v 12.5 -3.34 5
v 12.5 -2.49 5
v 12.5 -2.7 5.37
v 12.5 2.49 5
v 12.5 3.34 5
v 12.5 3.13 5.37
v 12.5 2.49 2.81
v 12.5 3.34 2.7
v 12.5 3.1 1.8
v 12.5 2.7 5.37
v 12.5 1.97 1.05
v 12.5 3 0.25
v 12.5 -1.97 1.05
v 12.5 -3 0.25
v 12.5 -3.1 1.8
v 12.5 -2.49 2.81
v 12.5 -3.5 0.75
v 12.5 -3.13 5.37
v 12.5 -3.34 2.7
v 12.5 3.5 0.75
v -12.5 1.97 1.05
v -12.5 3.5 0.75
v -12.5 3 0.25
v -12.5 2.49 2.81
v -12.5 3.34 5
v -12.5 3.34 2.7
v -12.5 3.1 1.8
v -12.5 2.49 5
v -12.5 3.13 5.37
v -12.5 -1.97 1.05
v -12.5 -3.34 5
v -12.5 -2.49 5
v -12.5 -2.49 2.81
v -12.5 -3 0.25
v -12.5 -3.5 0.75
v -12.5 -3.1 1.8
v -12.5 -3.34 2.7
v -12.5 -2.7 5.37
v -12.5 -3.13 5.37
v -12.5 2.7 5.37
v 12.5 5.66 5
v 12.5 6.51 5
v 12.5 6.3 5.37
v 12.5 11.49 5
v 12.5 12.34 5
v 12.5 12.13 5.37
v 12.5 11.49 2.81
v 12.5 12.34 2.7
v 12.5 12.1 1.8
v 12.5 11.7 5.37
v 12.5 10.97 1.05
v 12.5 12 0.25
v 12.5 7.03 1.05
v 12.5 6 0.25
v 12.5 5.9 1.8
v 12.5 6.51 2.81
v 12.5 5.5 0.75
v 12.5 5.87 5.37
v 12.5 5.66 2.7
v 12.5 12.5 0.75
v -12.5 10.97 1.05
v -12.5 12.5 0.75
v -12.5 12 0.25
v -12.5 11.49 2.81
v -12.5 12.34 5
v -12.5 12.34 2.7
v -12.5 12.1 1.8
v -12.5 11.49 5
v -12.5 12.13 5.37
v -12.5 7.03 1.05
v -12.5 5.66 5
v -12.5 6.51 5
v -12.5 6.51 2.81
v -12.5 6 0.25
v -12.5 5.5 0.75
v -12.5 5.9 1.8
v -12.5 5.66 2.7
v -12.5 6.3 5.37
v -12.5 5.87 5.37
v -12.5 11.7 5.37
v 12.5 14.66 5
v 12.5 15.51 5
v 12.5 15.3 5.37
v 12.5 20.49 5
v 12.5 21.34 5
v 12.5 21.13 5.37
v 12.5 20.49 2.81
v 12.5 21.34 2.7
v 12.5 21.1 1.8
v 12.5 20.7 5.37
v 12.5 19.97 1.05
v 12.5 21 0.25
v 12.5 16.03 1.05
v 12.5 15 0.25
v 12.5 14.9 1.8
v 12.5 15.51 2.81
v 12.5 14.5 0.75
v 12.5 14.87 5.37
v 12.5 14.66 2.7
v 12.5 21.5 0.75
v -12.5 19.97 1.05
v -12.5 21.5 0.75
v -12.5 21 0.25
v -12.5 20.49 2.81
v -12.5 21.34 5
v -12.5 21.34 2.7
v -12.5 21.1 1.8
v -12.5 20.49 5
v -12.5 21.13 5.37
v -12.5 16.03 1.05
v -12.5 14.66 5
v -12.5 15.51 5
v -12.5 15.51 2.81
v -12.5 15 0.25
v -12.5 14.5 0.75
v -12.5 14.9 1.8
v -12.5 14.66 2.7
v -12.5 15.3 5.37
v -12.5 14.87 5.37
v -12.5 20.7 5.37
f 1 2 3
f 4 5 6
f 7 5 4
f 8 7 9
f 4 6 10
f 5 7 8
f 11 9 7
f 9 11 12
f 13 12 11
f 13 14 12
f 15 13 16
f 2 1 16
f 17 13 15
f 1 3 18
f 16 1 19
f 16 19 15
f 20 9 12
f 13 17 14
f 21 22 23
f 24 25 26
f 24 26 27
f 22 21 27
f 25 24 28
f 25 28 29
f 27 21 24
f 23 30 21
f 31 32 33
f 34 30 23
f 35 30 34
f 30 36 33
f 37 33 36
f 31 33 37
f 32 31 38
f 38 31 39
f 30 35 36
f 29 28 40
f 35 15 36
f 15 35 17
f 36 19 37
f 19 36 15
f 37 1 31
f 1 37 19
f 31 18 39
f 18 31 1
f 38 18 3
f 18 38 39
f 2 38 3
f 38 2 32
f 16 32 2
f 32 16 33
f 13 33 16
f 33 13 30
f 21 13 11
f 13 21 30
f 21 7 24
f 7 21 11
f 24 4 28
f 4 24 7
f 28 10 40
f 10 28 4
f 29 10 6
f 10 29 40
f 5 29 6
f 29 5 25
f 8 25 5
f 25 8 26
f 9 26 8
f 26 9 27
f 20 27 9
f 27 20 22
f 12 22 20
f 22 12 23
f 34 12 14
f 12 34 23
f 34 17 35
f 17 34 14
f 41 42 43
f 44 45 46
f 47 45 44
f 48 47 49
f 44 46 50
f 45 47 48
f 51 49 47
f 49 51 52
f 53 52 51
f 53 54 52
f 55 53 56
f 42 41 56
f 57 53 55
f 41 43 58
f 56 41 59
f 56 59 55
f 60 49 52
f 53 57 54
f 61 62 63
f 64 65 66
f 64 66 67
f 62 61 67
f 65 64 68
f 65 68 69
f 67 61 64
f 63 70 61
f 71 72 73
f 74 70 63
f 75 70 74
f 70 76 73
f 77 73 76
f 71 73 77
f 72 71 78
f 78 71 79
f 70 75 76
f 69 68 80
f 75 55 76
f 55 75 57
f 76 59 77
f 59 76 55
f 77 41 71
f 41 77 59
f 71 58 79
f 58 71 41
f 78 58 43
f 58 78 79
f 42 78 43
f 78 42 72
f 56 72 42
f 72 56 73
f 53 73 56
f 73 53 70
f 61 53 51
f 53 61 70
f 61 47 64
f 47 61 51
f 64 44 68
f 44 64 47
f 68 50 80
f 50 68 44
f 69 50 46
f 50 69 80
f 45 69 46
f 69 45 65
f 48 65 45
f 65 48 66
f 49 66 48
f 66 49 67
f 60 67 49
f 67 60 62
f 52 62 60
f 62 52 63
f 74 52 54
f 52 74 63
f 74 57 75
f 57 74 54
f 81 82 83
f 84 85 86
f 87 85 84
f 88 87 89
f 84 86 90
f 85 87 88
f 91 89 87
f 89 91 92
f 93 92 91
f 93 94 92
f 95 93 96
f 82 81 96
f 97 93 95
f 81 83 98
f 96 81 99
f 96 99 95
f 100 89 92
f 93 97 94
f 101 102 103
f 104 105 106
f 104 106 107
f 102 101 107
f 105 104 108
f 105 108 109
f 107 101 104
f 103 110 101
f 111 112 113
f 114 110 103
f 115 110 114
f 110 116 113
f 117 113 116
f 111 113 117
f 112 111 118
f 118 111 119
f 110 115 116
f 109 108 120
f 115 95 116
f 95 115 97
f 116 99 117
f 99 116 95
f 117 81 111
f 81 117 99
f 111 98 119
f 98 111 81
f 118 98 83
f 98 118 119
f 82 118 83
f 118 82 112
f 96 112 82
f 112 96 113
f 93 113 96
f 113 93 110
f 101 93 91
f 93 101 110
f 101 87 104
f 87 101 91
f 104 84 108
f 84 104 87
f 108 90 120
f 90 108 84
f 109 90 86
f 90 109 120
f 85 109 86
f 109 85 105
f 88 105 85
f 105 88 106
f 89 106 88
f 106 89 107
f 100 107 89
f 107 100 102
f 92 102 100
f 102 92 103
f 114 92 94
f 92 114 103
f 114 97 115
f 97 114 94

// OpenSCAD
//Remix of V-Slot cover for adjustable fit
//2/16/2019 By David Bunch
//Remixed from: https://www.thingiverse.com/thing:832077
//
Test = 0;           //0 = Final Print,  1 = Test Print
Len = 25;          //165 * 3 = 495mm
Qty = 3;
Gap = 3.1;          //3.1 = 1/2 Dimensioned Gap distance where channel connects to V-Slot

V1 = 0.0;           //Thickness at V connection
                    //0.1 would be tighter fit, -0.1 would be looser fit
                    //-.1 works best for me
Z1 =  .25;

A_T1 = [.05, .025, 0, -.025 -.05, -.075];      //Used for Test print
Test_Qty = len(A_T1);
echo(Test_Qty = Test_Qty);

// StampN = 1; // Number of stamps: 0 - no stamps, 1 - one centered, ...
StampText = ""; // Set to empty string to use image
StampImport2D = "bear2.dxf"; // Used only inf StampText is empty
StampImage = "bear1.png"; // Used only if StampText and StampImport2D is empty
StampColor = "Red";
StampDepth = 0.3; // 0.8 - Maximum 
StampHeight = 4.2; // Define size of text or image height

// Setting number of stamps automatic by slot length and text lenght

ll = len(StampText)>0 ? len(StampText) : 1;

StampN = (Test==1) ? 1 : Len/(5*ll);


		
module V2020(V_Ht = Len)
{
    rotate([0,-90,0])
    rotate([0,0,-90])
    translate([0,10,0])
    difference()
    {
        linear_extrude(height = V_Ht, center = false, convexity = 10)polygon(points = 
        [[10,10],[10,4.9],[8.2,3.1],[8.2,5.5],[6.56,5.5],
        [3.9,2.84],[3.9,-2.84],[6.56,-5.5],[8.2,-5.5],[8.2,-3.1],
        [10,-4.9],[10,-10],[4.9,-10],[3.1,-8.2],[5.5,-8.2],
        [5.5,-6.56],[2.84,-3.9],[-2.84,-3.9],[-5.5,-6.56],[-5.5,-8.2],
        [-3.1,-8.2],[-4.9,-10],[-10,-10],[-10,-4.9],[-8.2,-3.1],
        [-8.2,-5.5],[-6.56,-5.5],[-3.9,-2.84],[-3.9,2.84],[-6.56,5.5],
        [-8.2,5.5],[-8.2,3.1],[-10,4.9],[-10,10],[-4.9,10],
        [-3.1,8.2],[-5.5,8.2],[-5.5,6.56],[-2.84,3.9],[2.84,3.9],
        [5.5,6.56],[5.5,8.2],[3.1,8.2],[4.9,10]]);
        translate([0,0,-1])
        cylinder(d=4.2,h=V_Ht+2,center=false,$fn=16);
    }
}
module Channel(T1 = -.1, Y1 = Z1)
{
    X1 = Gap + T1;
    echo(X1 = X1);
    echo(X1 * 2);
    rotate([0,-90,0])
    rotate([0,0,-90])
    linear_extrude(height = Len, center = false, convexity = 10)
	polygon(points = 
    [[3.13+T1,5.37],[3.34+T1,5],[3.34+T1,2.7],[3.1+T1,1.8],[3.5+T1,0.5+Y1],
    [3+T1,Y1],[-3-T1,Y1],[-3.5-T1,0.5+Y1],[-3.1-T1,1.8],[-3.34-T1,2.7],
    [-3.34-T1,5],[-3.13-T1,5.37],[-2.7-T1,5.37],[-2.49-T1,5],[-2.49-T1,2.81],
    [-1.97-T1,.8+Y1],[1.97+T1,.8+Y1],[2.49+T1,2.81],[2.49+T1,5],[2.7+T1,5.37]]);
	
}

module Stamps() {
	if (StampN > 0) {
		StampN = ceil(StampN);
		dX = Len / StampN;
		X1 = -Len/2 + dX/2;
		for (n=[0:1:StampN-1]) {
			translate([X1 + n*dX,0,0])
			Stamp() {
				children();
			}
		}
	}
}

module Stamp() {
	color(StampColor)
	translate([-Len/2, 0, Z1 + StampDepth - 0.001])
	resize([0,StampHeight,StampDepth], auto=[true,false,false])
	rotate([0,180,0])
	children();
}

if (Test == 0)
{
    translate([Len/2,0,0])
    %V2020();
    for (i = [0:Qty-1])
    {
        translate([Len/2,i * 9,0])
				difference() {
					Channel(V1,Z1);
					Stamps() {
						if (StampText > "") {
							linear_extrude(1)
							text(StampText, halign="center", valign="center");
						} else if(StampImport2D > "") {
							linear_extrude(1)
							translate([-86,-125,0])// Magic constanst to CENTER object
							import(StampImport2D);
						} else if (StampImage > "") {
							translate([0,0,100+1]) mirror([0,0,1])
							surface(StampImage, center=true);
						}
					}
				}
    }
} else if (Test == 1)
{
    translate([Len/2,0,0])
    %V2020();
    for (i = [0:Test_Qty-1])
    {
        translate([Len/2,i * 9,0])
				difference() {
					Channel(A_T1[i],Z1);
					Stamps() {
						scale([0.61,1,1])
						linear_extrude(1)
						text(str("V1=",A_T1[i]), halign="center", valign="center");
					}
				}
    }
}
